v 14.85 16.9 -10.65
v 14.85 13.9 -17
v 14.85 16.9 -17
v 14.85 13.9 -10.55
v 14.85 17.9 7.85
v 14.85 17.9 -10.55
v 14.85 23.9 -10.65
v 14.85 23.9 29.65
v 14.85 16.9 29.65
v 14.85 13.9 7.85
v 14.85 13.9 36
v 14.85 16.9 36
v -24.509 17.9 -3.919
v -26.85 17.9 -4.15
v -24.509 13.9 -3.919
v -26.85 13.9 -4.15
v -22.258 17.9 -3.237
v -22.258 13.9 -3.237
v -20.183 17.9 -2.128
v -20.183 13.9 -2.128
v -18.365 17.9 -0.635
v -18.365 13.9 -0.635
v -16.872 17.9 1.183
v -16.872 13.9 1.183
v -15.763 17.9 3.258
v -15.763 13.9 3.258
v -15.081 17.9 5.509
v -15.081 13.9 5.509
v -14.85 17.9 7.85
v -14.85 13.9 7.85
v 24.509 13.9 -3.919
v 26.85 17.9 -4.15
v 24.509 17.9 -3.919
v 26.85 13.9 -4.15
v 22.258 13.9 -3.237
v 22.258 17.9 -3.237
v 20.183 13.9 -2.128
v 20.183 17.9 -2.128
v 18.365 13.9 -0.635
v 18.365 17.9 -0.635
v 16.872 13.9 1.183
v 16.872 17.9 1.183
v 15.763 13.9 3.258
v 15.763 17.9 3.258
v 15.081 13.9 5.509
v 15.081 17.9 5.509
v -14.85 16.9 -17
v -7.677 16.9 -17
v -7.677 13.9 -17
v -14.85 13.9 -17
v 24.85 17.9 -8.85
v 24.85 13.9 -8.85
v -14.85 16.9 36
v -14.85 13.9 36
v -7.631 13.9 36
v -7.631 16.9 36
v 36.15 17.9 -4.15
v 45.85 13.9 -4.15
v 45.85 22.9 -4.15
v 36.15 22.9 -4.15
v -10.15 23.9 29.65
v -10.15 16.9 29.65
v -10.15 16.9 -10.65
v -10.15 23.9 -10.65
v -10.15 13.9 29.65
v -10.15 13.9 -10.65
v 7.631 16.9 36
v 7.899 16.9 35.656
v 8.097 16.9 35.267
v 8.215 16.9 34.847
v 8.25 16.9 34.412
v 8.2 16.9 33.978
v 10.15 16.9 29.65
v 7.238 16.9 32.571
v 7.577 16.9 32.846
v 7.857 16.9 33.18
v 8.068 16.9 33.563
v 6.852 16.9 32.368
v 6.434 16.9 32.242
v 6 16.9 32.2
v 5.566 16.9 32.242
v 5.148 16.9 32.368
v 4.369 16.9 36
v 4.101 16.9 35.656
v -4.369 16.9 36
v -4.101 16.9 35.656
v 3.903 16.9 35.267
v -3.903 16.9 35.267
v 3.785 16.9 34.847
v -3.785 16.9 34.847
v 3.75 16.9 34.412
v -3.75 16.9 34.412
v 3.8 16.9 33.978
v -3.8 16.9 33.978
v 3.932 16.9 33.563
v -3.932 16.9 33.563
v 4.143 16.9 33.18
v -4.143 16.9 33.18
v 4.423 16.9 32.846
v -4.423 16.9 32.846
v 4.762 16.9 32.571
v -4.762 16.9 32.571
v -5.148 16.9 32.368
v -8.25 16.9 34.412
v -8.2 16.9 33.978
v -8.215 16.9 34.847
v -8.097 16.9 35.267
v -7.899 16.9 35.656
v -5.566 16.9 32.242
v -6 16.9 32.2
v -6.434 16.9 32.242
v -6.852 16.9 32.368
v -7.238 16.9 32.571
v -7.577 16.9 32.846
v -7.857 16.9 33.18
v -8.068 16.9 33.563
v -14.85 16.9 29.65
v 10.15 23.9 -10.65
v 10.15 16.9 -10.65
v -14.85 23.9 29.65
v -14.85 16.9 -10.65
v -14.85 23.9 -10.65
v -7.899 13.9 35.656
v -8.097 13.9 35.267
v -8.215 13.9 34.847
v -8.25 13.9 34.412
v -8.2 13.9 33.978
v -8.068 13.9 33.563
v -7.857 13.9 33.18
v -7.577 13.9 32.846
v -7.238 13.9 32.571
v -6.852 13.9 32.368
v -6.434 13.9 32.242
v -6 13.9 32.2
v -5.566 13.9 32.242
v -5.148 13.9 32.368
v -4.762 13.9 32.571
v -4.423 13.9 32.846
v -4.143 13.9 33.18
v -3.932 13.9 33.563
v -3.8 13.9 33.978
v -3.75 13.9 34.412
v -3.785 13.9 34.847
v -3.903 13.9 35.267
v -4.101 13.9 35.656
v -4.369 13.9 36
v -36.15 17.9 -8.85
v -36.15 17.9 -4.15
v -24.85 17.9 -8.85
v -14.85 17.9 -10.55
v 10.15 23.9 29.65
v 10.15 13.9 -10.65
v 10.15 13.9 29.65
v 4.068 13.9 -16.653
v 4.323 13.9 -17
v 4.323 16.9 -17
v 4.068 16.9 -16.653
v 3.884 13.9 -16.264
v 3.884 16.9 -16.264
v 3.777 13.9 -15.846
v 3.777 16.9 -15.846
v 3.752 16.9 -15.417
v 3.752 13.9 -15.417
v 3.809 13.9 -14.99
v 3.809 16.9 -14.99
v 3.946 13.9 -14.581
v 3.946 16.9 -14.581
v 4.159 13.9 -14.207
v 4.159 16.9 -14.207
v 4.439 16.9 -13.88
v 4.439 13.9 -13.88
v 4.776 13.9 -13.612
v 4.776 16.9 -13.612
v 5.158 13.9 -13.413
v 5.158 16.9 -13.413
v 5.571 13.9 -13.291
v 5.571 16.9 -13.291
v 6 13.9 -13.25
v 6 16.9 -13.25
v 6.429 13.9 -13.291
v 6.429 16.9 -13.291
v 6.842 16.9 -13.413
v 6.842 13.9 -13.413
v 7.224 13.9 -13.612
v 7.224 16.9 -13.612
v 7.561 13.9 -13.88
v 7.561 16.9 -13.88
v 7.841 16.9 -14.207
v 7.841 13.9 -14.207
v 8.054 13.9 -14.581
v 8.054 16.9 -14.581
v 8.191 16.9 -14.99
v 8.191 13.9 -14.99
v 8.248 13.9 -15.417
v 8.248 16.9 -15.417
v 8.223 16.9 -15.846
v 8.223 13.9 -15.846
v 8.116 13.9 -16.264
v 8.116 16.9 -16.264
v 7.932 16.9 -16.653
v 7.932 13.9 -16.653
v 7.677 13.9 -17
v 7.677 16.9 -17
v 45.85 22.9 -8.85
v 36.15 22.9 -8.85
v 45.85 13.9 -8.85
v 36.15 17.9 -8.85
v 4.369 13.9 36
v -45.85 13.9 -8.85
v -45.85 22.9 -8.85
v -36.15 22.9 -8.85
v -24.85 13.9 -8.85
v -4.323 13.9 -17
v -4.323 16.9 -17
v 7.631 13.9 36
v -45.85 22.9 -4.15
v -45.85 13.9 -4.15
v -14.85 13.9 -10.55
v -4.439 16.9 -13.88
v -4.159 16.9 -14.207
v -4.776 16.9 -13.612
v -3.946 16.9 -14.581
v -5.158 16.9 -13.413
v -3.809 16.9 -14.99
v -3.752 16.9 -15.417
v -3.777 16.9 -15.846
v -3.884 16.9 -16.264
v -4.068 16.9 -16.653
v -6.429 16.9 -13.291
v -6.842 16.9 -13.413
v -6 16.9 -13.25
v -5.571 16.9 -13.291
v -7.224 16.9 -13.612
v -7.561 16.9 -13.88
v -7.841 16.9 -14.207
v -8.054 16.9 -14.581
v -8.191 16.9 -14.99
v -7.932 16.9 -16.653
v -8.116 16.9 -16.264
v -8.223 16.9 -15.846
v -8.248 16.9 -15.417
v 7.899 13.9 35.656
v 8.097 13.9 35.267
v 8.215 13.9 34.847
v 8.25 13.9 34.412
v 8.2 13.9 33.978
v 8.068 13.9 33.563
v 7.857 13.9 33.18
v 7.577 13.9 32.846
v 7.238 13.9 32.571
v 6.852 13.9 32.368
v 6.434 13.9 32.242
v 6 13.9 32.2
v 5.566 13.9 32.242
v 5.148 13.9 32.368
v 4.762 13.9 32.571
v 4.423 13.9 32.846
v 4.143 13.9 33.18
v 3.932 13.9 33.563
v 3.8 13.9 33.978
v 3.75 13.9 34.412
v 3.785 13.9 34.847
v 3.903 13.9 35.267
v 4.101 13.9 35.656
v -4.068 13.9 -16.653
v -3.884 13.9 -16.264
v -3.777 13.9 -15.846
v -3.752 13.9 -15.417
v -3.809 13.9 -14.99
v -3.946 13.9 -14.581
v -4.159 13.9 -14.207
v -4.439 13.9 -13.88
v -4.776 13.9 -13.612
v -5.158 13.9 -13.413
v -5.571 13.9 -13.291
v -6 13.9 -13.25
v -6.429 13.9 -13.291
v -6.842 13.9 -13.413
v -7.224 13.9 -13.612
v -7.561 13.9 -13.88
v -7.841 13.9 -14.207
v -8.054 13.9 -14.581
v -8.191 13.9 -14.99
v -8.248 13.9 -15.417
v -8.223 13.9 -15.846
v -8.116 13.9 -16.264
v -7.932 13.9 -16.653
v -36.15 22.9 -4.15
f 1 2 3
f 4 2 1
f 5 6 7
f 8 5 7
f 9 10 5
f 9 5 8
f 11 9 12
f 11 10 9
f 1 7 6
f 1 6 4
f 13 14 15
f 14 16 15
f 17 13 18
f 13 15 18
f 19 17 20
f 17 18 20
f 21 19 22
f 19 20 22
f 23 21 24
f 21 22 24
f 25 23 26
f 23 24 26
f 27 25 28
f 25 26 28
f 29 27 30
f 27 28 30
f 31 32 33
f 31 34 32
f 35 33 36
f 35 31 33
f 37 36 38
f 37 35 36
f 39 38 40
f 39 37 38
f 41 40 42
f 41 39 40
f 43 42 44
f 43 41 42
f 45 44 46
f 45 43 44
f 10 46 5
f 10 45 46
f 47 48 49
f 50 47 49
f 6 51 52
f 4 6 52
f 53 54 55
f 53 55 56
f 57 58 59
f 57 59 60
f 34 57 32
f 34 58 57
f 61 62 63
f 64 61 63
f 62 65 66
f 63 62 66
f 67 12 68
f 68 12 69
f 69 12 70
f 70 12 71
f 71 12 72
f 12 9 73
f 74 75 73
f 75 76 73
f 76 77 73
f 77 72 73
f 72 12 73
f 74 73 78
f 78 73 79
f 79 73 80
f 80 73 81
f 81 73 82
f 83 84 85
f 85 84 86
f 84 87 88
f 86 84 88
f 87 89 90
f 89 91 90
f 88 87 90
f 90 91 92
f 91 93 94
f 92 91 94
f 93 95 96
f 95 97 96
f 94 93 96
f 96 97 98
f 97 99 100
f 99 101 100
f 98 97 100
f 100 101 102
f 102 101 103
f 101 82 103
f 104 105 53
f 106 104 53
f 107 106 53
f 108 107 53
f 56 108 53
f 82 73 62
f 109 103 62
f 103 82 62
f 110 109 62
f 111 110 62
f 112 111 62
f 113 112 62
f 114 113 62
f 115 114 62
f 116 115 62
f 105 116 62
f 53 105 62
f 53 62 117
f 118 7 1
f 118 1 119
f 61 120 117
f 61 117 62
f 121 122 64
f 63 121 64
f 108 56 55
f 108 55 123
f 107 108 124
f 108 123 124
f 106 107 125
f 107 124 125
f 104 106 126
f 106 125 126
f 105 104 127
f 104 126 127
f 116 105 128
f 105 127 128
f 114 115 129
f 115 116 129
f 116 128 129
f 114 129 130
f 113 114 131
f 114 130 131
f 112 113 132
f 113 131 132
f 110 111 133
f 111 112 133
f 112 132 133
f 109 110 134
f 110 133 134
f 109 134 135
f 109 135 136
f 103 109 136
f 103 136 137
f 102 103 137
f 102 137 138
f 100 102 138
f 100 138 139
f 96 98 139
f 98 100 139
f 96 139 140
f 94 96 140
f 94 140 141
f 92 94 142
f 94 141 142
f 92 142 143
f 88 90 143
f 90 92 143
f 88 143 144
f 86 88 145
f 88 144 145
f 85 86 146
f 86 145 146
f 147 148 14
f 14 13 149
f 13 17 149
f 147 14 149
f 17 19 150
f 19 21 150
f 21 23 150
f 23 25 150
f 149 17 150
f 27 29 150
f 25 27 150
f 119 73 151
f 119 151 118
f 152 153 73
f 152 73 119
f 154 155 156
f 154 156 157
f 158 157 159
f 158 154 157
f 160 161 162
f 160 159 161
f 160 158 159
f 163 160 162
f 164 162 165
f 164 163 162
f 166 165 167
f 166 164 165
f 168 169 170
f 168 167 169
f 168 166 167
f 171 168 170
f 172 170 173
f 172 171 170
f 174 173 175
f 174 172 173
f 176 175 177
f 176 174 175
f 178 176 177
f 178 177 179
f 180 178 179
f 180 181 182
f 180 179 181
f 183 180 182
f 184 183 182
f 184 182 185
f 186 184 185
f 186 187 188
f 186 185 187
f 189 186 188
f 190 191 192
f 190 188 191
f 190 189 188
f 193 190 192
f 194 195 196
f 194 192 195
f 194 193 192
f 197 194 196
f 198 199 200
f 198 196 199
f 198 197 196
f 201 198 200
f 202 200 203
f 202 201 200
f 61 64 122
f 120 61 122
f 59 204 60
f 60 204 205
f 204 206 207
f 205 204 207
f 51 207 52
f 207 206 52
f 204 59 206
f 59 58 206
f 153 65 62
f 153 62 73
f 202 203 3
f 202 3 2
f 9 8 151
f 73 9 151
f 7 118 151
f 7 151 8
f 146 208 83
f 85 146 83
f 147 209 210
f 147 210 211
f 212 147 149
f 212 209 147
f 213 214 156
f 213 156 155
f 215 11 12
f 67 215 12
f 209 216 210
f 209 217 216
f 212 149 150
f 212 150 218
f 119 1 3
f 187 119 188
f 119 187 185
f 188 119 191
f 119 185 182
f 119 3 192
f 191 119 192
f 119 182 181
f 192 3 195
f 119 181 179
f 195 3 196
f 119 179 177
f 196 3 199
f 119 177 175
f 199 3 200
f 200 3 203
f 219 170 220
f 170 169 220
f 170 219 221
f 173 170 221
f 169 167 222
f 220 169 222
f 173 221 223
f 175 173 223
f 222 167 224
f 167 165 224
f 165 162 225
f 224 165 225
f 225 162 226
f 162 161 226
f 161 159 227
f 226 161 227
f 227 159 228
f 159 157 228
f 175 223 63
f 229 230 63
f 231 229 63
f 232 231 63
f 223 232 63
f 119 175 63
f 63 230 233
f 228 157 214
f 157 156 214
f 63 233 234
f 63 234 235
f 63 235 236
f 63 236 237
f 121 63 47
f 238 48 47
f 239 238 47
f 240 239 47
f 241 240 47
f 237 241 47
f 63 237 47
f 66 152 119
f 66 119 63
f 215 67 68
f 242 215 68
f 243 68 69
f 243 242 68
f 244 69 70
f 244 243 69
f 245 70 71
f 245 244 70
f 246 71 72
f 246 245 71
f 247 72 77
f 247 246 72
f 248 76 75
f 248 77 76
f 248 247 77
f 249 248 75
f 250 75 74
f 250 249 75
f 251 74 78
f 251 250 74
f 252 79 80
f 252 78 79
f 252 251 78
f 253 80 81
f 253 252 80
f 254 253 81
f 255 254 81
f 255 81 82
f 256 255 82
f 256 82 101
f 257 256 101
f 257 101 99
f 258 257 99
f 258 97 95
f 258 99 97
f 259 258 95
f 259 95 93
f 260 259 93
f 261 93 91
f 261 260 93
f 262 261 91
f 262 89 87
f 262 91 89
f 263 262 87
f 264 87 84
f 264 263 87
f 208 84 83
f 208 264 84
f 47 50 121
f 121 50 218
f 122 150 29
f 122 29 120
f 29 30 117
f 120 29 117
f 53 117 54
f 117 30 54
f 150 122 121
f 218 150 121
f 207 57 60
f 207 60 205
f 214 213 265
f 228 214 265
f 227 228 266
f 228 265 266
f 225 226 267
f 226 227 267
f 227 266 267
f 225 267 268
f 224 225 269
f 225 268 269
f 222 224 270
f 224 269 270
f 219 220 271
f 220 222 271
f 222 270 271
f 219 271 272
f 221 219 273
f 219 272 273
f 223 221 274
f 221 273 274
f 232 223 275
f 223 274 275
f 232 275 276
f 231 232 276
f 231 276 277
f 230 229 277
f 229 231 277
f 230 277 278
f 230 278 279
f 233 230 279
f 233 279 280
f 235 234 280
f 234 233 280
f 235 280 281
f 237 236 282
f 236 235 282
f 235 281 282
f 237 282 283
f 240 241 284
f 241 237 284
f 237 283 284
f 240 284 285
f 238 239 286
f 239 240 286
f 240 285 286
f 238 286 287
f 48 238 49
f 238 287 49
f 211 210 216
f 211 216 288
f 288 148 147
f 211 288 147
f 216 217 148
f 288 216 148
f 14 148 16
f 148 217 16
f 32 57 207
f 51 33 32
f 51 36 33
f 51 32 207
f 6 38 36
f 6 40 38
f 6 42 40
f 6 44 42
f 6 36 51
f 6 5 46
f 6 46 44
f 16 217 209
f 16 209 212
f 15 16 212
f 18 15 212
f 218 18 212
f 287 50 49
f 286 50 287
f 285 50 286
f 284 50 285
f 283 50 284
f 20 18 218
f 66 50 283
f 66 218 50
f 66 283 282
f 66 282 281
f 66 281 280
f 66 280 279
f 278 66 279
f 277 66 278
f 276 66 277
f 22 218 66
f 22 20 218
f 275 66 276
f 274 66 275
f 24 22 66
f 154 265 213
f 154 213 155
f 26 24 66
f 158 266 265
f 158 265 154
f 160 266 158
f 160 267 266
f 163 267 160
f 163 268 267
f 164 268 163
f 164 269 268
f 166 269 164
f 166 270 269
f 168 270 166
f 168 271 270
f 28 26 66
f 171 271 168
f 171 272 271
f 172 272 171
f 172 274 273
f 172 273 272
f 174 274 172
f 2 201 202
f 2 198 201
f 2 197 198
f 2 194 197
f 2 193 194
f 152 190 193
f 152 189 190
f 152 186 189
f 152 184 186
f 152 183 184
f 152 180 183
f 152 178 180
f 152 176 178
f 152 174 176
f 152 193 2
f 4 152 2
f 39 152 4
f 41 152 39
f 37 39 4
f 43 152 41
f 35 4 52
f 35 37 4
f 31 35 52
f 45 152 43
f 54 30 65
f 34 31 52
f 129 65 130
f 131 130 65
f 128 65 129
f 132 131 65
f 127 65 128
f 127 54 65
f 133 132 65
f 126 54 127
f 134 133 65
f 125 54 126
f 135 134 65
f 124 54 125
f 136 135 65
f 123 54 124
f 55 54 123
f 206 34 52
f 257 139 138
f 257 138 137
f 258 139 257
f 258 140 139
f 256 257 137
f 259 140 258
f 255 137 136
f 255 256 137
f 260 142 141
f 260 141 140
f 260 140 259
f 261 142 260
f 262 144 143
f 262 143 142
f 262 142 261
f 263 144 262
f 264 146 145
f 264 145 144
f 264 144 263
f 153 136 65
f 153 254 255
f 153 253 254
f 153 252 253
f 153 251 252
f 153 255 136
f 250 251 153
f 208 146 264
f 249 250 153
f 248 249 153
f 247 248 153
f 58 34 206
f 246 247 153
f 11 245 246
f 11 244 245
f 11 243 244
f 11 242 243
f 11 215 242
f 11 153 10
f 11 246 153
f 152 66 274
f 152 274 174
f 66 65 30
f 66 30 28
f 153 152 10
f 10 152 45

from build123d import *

# Parameters (mm, degrees)
SKETCH055_R       = 2.25
PAD023_DEPTH      = 10
SKETCH056_W       = 4.7
SKETCH056_H       = 4
PAD024_DEPTH      = 31
SKETCH057_W       = 9.7
SKETCH057_H       = 4.7
PAD025_DEPTH      = 5
SKETCH058_W       = 14.85
SKETCH058_H       = 7.35
POCKET028_DEPTH   = 7
POCKET028_FACE1_W = 3
POCKET028_FACE1_H = 14.85
POCKET029_DEPTH   = 1
POCKET029_FACE4_W = 3
POCKET029_FACE4_H = 14.85
POCKET030_DEPTH   = 1
FILLET005_R       = 12
CHAMFER002_SIZE2  = 10
CHAMFER002_SIZE   = 1.7


with BuildPart() as part:
    # Sketch055 → Pad023 (new body)
    with BuildSketch(Plane.XZ):
        Polygon((-10.15, 29.65), (-10.15, -10.65), (0, -10.65), (0, -18), (-14.85, -18), (-14.85, 37), (0, 37), (0, 29.65), align=None)
        with Locations((-6, 34.45)):
            Circle(SKETCH055_R, mode=Mode.SUBTRACT)
        with Locations((-6, -15.5)):
            Circle(SKETCH055_R, mode=Mode.SUBTRACT)
    extrude(amount=-PAD023_DEPTH)

    # Sketch056 (on Face8 of Pad023) → Pad024 (join)
    with BuildSketch(Plane(origin=(-14.85, 0, 0), x_dir=(0, 0, -1), z_dir=(-1, 0, 0))):
        with Locations((6.5, -2)):
            Rectangle(SKETCH056_W, SKETCH056_H)
    extrude(amount=PAD024_DEPTH)

    # Sketch057 (on Face7 of Pad024) → Pad025 (join)
    with BuildSketch(Plane(origin=(0, 4, 0), x_dir=(1, 0, 0), z_dir=(0, 1, 0))):
        with Locations((-41, 6.5)):
            Rectangle(SKETCH057_W, SKETCH057_H)
    extrude(amount=PAD025_DEPTH)

    # Sketch058 (on Face5 of Pad025) → Pocket028 (cut)
    with BuildSketch(Plane(origin=(0, 10, 0), x_dir=(1, 0, 0), z_dir=(0, 1, 0))):
        with Locations((-7.425, 14.325)):
            Rectangle(SKETCH058_W, SKETCH058_H)
        with Locations((-7.425, -33.325)):
            Rectangle(SKETCH058_W, SKETCH058_H)
    extrude(amount=-POCKET028_DEPTH, mode=Mode.SUBTRACT)

    # Pocket028 Face1 → Pocket029 (cut)
    with BuildSketch(Plane(origin=(-7.425, 1.5, 37), x_dir=(0, 1, 0), z_dir=(0, 0, 1))):
        Rectangle(POCKET028_FACE1_W, POCKET028_FACE1_H)
    extrude(amount=-POCKET029_DEPTH, mode=Mode.SUBTRACT)

    # Pocket029 Face4 → Pocket030 (cut)
    with BuildSketch(Plane(origin=(-7.425, 1.5, -18), x_dir=(0, -1, 0), z_dir=(0, 0, -1))):
        Rectangle(POCKET029_FACE4_W, POCKET029_FACE4_H)
    extrude(amount=-POCKET030_DEPTH, mode=Mode.SUBTRACT)

    # Fillet005
    fillet005_edges = [part.edges().sort_by_distance(p)[0] for p in [
        (-14.85, 2, -4.15),
    ]]
    fillet(fillet005_edges, radius=FILLET005_R)

    # Chamfer002
    chamfer002_edges = [part.edges().sort_by_distance(p)[0] for p in [
        (-14.85, 2, -8.85),
    ]]
    chamfer002_side = part.faces().sort_by_distance((-14.85, 5.179134, 11.284665))[0]
    chamfer(chamfer002_edges, length=CHAMFER002_SIZE, length2=CHAMFER002_SIZE2, reference=chamfer002_side)

    # Mirrored002: part across YZ


with BuildPart() as part_1:
    add(part.part)
    add(part.part.mirror(Plane.YZ))


with BuildPart() as part_2:
    # Body012 placement: moved
    add(part_1.part.moved(Location((0, 13.9, 0))))


solid = part_2.part
